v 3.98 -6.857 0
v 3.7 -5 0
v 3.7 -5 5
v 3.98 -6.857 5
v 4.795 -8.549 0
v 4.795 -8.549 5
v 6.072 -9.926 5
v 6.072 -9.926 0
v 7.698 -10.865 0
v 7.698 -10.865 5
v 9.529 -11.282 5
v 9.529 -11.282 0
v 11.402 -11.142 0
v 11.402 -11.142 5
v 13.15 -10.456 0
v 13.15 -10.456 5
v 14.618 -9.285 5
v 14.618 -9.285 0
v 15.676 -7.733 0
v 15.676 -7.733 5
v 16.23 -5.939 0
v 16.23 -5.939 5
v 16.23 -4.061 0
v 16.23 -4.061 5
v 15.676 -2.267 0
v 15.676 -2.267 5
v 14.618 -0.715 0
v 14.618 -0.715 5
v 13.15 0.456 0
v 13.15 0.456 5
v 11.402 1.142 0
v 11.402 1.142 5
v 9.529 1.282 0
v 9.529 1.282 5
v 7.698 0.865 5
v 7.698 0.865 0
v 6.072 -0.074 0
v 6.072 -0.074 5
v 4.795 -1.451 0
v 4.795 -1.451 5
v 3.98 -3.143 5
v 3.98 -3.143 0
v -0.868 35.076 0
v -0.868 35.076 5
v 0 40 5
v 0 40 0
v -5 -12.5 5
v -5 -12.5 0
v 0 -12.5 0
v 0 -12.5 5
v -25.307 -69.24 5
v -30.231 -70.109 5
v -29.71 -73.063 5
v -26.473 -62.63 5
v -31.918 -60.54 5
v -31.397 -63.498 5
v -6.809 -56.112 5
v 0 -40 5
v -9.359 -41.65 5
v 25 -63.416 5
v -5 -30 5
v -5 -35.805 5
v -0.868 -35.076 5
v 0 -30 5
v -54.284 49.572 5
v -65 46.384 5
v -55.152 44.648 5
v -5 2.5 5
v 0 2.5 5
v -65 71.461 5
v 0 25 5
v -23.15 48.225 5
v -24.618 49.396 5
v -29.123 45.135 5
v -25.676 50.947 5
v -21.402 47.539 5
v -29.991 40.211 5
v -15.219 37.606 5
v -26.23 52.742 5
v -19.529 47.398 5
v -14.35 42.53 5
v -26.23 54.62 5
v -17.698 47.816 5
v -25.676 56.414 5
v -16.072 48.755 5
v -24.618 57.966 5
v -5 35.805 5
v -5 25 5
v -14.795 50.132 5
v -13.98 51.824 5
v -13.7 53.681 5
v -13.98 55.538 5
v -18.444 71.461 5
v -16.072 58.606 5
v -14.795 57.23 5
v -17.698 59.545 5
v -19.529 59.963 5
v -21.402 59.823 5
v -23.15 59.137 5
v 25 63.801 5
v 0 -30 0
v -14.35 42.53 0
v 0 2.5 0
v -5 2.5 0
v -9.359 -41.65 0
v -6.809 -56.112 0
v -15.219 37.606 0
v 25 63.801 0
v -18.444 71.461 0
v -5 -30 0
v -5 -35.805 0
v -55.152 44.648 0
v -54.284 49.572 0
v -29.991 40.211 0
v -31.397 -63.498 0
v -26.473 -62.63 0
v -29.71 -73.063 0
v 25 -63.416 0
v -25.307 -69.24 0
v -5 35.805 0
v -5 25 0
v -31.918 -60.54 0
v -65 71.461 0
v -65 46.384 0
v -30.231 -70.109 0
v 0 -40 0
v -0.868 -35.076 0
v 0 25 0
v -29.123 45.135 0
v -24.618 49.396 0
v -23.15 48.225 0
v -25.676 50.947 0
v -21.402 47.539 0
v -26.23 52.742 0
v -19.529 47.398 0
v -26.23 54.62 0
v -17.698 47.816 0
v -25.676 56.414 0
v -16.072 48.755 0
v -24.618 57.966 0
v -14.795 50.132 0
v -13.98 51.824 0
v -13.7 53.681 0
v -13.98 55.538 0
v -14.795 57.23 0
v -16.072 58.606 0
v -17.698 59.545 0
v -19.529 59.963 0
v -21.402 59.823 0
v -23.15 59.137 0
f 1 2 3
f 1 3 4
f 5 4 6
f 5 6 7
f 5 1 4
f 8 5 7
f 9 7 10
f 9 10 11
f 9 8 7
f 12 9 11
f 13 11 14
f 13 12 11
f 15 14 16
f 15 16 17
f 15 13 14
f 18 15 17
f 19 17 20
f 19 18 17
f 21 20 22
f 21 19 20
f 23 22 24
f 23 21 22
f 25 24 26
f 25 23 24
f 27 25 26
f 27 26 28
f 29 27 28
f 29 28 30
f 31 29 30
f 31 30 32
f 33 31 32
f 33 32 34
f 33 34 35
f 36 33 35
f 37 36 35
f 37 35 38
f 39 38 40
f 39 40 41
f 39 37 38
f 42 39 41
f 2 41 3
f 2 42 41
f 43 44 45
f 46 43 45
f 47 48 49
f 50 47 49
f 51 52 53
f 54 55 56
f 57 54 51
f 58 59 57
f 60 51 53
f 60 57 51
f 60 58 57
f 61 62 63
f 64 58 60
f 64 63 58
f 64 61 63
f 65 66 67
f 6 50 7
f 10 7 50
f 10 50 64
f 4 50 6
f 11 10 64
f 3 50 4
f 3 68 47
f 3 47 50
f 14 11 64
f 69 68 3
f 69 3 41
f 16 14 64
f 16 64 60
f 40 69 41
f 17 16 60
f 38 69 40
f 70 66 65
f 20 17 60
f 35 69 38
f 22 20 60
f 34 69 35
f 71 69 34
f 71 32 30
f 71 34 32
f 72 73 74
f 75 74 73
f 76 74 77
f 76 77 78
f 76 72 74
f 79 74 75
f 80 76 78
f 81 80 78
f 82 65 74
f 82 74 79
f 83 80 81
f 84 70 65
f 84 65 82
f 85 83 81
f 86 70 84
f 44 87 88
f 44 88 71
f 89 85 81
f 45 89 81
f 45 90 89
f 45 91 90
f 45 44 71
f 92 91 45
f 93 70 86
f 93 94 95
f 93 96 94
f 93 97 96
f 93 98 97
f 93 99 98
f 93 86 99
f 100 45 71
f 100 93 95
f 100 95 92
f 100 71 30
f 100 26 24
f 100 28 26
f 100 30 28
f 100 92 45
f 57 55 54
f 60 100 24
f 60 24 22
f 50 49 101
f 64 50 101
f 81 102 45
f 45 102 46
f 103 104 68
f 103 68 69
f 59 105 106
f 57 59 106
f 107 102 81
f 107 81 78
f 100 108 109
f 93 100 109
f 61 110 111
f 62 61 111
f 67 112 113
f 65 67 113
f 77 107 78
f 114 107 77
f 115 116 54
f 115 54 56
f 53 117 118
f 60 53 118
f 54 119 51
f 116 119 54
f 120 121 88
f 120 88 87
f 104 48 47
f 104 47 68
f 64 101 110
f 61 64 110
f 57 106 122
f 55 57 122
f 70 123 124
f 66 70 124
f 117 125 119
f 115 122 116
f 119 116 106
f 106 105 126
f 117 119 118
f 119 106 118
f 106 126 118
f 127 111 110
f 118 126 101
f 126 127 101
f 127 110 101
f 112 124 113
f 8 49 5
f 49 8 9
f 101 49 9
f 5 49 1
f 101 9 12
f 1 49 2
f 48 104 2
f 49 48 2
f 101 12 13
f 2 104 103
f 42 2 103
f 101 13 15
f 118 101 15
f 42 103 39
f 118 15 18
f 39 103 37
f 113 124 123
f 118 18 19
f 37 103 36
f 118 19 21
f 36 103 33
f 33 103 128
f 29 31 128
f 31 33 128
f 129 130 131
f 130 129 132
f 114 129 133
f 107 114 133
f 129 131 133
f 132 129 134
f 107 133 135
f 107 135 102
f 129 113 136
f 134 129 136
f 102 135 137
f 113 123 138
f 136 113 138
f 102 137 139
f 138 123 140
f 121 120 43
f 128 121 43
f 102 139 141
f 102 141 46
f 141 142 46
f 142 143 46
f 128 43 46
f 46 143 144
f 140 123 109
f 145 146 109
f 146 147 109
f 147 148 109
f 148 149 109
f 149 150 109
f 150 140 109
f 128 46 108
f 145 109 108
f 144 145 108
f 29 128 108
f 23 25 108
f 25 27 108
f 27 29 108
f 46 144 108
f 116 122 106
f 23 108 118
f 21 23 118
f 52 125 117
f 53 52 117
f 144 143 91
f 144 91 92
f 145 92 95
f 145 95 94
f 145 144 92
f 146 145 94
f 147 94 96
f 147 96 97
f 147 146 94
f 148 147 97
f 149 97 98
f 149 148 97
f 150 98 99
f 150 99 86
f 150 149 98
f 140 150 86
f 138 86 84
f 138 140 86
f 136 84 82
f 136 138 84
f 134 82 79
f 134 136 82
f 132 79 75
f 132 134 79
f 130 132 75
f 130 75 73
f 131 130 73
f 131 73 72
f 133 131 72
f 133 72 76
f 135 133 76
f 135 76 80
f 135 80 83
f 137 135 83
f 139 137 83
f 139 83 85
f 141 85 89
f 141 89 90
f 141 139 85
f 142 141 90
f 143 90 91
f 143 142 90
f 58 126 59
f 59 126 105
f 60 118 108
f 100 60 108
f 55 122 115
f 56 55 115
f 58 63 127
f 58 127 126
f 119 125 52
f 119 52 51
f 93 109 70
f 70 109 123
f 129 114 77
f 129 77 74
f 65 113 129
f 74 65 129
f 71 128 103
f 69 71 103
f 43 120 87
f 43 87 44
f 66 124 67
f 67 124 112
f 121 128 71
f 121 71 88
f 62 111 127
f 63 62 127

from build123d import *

# Parameters (mm, degrees)
ESQUISSE1_R             = 6.3
BOSS_EXTRU_1_DEPTH      = 5
ENL_V_MAT_EXTRU_1_DEPTH = 5
ESQUISSE3_W             = 5
ESQUISSE3_H             = 15
BOSS_EXTRU_3_DEPTH      = 5


with BuildPart() as part:
    # Esquisse1 → Boss.-Extru.1 (new body)
    with BuildSketch(Plane.XY):
        Polygon((-65, 51.461253746), (0, 40), (0, -40), (-9.359100785, -41.650261983), (-6.809077296, -56.112163836), (-31.918247866, -60.539588071), (-29.710027076, -73.063030491), (25, -63.416176602), (25, 63.800831685), (-18.444412366, 71.461253746), (-65, 71.461253746), align=None)
        with Locations((-20, 53.680805733)):
            Circle(ESQUISSE1_R, mode=Mode.SUBTRACT)
        with Locations(Location((10, -5, 0), (0, 0, 180))):
            Circle(ESQUISSE1_R, mode=Mode.SUBTRACT)
    extrude(amount=BOSS_EXTRU_1_DEPTH)

    # Esquisse2 → Enlèv. mat.-Extru.1 (cut)
    with BuildSketch(Plane(origin=(0, 0, 0), x_dir=(-1, 0, 0), z_dir=(0, 0, -1))):
        Polygon((31.396602506, -63.497985917), (30.230971609, -70.108607232), (25.306932844, -69.240366344), (26.472563741, -62.629745029), align=None)
    extrude(amount=-ENL_V_MAT_EXTRU_1_DEPTH, mode=Mode.SUBTRACT)

    # Esquisse3 → Boss.-Extru.3 (add)
    with BuildSketch(Plane.XY):
        Polygon((0, -40), (0, -30), (-5, -30), (-5, -35.804501844), (-0.868240888, -35.075961235), align=None)
        with Locations((-2.5, -5)):
            Rectangle(ESQUISSE3_W, ESQUISSE3_H)
        Polygon((-0.868240888, 35.075961235), (0, 40), (0, 25), (-5, 25), (-5, 35.804501844), align=None)
        Polygon((-29.122539924, 45.135089535), (-14.350423629, 42.53036687), (-15.218664517, 37.606328105), (-29.990780813, 40.21105077), align=None)
        Polygon((-65, 51.461253746), (-65, 46.384120687), (-55.15192247, 44.64763891), (-54.283681582, 49.571677675), align=None)
    extrude(amount=BOSS_EXTRU_3_DEPTH)


solid = part.part
